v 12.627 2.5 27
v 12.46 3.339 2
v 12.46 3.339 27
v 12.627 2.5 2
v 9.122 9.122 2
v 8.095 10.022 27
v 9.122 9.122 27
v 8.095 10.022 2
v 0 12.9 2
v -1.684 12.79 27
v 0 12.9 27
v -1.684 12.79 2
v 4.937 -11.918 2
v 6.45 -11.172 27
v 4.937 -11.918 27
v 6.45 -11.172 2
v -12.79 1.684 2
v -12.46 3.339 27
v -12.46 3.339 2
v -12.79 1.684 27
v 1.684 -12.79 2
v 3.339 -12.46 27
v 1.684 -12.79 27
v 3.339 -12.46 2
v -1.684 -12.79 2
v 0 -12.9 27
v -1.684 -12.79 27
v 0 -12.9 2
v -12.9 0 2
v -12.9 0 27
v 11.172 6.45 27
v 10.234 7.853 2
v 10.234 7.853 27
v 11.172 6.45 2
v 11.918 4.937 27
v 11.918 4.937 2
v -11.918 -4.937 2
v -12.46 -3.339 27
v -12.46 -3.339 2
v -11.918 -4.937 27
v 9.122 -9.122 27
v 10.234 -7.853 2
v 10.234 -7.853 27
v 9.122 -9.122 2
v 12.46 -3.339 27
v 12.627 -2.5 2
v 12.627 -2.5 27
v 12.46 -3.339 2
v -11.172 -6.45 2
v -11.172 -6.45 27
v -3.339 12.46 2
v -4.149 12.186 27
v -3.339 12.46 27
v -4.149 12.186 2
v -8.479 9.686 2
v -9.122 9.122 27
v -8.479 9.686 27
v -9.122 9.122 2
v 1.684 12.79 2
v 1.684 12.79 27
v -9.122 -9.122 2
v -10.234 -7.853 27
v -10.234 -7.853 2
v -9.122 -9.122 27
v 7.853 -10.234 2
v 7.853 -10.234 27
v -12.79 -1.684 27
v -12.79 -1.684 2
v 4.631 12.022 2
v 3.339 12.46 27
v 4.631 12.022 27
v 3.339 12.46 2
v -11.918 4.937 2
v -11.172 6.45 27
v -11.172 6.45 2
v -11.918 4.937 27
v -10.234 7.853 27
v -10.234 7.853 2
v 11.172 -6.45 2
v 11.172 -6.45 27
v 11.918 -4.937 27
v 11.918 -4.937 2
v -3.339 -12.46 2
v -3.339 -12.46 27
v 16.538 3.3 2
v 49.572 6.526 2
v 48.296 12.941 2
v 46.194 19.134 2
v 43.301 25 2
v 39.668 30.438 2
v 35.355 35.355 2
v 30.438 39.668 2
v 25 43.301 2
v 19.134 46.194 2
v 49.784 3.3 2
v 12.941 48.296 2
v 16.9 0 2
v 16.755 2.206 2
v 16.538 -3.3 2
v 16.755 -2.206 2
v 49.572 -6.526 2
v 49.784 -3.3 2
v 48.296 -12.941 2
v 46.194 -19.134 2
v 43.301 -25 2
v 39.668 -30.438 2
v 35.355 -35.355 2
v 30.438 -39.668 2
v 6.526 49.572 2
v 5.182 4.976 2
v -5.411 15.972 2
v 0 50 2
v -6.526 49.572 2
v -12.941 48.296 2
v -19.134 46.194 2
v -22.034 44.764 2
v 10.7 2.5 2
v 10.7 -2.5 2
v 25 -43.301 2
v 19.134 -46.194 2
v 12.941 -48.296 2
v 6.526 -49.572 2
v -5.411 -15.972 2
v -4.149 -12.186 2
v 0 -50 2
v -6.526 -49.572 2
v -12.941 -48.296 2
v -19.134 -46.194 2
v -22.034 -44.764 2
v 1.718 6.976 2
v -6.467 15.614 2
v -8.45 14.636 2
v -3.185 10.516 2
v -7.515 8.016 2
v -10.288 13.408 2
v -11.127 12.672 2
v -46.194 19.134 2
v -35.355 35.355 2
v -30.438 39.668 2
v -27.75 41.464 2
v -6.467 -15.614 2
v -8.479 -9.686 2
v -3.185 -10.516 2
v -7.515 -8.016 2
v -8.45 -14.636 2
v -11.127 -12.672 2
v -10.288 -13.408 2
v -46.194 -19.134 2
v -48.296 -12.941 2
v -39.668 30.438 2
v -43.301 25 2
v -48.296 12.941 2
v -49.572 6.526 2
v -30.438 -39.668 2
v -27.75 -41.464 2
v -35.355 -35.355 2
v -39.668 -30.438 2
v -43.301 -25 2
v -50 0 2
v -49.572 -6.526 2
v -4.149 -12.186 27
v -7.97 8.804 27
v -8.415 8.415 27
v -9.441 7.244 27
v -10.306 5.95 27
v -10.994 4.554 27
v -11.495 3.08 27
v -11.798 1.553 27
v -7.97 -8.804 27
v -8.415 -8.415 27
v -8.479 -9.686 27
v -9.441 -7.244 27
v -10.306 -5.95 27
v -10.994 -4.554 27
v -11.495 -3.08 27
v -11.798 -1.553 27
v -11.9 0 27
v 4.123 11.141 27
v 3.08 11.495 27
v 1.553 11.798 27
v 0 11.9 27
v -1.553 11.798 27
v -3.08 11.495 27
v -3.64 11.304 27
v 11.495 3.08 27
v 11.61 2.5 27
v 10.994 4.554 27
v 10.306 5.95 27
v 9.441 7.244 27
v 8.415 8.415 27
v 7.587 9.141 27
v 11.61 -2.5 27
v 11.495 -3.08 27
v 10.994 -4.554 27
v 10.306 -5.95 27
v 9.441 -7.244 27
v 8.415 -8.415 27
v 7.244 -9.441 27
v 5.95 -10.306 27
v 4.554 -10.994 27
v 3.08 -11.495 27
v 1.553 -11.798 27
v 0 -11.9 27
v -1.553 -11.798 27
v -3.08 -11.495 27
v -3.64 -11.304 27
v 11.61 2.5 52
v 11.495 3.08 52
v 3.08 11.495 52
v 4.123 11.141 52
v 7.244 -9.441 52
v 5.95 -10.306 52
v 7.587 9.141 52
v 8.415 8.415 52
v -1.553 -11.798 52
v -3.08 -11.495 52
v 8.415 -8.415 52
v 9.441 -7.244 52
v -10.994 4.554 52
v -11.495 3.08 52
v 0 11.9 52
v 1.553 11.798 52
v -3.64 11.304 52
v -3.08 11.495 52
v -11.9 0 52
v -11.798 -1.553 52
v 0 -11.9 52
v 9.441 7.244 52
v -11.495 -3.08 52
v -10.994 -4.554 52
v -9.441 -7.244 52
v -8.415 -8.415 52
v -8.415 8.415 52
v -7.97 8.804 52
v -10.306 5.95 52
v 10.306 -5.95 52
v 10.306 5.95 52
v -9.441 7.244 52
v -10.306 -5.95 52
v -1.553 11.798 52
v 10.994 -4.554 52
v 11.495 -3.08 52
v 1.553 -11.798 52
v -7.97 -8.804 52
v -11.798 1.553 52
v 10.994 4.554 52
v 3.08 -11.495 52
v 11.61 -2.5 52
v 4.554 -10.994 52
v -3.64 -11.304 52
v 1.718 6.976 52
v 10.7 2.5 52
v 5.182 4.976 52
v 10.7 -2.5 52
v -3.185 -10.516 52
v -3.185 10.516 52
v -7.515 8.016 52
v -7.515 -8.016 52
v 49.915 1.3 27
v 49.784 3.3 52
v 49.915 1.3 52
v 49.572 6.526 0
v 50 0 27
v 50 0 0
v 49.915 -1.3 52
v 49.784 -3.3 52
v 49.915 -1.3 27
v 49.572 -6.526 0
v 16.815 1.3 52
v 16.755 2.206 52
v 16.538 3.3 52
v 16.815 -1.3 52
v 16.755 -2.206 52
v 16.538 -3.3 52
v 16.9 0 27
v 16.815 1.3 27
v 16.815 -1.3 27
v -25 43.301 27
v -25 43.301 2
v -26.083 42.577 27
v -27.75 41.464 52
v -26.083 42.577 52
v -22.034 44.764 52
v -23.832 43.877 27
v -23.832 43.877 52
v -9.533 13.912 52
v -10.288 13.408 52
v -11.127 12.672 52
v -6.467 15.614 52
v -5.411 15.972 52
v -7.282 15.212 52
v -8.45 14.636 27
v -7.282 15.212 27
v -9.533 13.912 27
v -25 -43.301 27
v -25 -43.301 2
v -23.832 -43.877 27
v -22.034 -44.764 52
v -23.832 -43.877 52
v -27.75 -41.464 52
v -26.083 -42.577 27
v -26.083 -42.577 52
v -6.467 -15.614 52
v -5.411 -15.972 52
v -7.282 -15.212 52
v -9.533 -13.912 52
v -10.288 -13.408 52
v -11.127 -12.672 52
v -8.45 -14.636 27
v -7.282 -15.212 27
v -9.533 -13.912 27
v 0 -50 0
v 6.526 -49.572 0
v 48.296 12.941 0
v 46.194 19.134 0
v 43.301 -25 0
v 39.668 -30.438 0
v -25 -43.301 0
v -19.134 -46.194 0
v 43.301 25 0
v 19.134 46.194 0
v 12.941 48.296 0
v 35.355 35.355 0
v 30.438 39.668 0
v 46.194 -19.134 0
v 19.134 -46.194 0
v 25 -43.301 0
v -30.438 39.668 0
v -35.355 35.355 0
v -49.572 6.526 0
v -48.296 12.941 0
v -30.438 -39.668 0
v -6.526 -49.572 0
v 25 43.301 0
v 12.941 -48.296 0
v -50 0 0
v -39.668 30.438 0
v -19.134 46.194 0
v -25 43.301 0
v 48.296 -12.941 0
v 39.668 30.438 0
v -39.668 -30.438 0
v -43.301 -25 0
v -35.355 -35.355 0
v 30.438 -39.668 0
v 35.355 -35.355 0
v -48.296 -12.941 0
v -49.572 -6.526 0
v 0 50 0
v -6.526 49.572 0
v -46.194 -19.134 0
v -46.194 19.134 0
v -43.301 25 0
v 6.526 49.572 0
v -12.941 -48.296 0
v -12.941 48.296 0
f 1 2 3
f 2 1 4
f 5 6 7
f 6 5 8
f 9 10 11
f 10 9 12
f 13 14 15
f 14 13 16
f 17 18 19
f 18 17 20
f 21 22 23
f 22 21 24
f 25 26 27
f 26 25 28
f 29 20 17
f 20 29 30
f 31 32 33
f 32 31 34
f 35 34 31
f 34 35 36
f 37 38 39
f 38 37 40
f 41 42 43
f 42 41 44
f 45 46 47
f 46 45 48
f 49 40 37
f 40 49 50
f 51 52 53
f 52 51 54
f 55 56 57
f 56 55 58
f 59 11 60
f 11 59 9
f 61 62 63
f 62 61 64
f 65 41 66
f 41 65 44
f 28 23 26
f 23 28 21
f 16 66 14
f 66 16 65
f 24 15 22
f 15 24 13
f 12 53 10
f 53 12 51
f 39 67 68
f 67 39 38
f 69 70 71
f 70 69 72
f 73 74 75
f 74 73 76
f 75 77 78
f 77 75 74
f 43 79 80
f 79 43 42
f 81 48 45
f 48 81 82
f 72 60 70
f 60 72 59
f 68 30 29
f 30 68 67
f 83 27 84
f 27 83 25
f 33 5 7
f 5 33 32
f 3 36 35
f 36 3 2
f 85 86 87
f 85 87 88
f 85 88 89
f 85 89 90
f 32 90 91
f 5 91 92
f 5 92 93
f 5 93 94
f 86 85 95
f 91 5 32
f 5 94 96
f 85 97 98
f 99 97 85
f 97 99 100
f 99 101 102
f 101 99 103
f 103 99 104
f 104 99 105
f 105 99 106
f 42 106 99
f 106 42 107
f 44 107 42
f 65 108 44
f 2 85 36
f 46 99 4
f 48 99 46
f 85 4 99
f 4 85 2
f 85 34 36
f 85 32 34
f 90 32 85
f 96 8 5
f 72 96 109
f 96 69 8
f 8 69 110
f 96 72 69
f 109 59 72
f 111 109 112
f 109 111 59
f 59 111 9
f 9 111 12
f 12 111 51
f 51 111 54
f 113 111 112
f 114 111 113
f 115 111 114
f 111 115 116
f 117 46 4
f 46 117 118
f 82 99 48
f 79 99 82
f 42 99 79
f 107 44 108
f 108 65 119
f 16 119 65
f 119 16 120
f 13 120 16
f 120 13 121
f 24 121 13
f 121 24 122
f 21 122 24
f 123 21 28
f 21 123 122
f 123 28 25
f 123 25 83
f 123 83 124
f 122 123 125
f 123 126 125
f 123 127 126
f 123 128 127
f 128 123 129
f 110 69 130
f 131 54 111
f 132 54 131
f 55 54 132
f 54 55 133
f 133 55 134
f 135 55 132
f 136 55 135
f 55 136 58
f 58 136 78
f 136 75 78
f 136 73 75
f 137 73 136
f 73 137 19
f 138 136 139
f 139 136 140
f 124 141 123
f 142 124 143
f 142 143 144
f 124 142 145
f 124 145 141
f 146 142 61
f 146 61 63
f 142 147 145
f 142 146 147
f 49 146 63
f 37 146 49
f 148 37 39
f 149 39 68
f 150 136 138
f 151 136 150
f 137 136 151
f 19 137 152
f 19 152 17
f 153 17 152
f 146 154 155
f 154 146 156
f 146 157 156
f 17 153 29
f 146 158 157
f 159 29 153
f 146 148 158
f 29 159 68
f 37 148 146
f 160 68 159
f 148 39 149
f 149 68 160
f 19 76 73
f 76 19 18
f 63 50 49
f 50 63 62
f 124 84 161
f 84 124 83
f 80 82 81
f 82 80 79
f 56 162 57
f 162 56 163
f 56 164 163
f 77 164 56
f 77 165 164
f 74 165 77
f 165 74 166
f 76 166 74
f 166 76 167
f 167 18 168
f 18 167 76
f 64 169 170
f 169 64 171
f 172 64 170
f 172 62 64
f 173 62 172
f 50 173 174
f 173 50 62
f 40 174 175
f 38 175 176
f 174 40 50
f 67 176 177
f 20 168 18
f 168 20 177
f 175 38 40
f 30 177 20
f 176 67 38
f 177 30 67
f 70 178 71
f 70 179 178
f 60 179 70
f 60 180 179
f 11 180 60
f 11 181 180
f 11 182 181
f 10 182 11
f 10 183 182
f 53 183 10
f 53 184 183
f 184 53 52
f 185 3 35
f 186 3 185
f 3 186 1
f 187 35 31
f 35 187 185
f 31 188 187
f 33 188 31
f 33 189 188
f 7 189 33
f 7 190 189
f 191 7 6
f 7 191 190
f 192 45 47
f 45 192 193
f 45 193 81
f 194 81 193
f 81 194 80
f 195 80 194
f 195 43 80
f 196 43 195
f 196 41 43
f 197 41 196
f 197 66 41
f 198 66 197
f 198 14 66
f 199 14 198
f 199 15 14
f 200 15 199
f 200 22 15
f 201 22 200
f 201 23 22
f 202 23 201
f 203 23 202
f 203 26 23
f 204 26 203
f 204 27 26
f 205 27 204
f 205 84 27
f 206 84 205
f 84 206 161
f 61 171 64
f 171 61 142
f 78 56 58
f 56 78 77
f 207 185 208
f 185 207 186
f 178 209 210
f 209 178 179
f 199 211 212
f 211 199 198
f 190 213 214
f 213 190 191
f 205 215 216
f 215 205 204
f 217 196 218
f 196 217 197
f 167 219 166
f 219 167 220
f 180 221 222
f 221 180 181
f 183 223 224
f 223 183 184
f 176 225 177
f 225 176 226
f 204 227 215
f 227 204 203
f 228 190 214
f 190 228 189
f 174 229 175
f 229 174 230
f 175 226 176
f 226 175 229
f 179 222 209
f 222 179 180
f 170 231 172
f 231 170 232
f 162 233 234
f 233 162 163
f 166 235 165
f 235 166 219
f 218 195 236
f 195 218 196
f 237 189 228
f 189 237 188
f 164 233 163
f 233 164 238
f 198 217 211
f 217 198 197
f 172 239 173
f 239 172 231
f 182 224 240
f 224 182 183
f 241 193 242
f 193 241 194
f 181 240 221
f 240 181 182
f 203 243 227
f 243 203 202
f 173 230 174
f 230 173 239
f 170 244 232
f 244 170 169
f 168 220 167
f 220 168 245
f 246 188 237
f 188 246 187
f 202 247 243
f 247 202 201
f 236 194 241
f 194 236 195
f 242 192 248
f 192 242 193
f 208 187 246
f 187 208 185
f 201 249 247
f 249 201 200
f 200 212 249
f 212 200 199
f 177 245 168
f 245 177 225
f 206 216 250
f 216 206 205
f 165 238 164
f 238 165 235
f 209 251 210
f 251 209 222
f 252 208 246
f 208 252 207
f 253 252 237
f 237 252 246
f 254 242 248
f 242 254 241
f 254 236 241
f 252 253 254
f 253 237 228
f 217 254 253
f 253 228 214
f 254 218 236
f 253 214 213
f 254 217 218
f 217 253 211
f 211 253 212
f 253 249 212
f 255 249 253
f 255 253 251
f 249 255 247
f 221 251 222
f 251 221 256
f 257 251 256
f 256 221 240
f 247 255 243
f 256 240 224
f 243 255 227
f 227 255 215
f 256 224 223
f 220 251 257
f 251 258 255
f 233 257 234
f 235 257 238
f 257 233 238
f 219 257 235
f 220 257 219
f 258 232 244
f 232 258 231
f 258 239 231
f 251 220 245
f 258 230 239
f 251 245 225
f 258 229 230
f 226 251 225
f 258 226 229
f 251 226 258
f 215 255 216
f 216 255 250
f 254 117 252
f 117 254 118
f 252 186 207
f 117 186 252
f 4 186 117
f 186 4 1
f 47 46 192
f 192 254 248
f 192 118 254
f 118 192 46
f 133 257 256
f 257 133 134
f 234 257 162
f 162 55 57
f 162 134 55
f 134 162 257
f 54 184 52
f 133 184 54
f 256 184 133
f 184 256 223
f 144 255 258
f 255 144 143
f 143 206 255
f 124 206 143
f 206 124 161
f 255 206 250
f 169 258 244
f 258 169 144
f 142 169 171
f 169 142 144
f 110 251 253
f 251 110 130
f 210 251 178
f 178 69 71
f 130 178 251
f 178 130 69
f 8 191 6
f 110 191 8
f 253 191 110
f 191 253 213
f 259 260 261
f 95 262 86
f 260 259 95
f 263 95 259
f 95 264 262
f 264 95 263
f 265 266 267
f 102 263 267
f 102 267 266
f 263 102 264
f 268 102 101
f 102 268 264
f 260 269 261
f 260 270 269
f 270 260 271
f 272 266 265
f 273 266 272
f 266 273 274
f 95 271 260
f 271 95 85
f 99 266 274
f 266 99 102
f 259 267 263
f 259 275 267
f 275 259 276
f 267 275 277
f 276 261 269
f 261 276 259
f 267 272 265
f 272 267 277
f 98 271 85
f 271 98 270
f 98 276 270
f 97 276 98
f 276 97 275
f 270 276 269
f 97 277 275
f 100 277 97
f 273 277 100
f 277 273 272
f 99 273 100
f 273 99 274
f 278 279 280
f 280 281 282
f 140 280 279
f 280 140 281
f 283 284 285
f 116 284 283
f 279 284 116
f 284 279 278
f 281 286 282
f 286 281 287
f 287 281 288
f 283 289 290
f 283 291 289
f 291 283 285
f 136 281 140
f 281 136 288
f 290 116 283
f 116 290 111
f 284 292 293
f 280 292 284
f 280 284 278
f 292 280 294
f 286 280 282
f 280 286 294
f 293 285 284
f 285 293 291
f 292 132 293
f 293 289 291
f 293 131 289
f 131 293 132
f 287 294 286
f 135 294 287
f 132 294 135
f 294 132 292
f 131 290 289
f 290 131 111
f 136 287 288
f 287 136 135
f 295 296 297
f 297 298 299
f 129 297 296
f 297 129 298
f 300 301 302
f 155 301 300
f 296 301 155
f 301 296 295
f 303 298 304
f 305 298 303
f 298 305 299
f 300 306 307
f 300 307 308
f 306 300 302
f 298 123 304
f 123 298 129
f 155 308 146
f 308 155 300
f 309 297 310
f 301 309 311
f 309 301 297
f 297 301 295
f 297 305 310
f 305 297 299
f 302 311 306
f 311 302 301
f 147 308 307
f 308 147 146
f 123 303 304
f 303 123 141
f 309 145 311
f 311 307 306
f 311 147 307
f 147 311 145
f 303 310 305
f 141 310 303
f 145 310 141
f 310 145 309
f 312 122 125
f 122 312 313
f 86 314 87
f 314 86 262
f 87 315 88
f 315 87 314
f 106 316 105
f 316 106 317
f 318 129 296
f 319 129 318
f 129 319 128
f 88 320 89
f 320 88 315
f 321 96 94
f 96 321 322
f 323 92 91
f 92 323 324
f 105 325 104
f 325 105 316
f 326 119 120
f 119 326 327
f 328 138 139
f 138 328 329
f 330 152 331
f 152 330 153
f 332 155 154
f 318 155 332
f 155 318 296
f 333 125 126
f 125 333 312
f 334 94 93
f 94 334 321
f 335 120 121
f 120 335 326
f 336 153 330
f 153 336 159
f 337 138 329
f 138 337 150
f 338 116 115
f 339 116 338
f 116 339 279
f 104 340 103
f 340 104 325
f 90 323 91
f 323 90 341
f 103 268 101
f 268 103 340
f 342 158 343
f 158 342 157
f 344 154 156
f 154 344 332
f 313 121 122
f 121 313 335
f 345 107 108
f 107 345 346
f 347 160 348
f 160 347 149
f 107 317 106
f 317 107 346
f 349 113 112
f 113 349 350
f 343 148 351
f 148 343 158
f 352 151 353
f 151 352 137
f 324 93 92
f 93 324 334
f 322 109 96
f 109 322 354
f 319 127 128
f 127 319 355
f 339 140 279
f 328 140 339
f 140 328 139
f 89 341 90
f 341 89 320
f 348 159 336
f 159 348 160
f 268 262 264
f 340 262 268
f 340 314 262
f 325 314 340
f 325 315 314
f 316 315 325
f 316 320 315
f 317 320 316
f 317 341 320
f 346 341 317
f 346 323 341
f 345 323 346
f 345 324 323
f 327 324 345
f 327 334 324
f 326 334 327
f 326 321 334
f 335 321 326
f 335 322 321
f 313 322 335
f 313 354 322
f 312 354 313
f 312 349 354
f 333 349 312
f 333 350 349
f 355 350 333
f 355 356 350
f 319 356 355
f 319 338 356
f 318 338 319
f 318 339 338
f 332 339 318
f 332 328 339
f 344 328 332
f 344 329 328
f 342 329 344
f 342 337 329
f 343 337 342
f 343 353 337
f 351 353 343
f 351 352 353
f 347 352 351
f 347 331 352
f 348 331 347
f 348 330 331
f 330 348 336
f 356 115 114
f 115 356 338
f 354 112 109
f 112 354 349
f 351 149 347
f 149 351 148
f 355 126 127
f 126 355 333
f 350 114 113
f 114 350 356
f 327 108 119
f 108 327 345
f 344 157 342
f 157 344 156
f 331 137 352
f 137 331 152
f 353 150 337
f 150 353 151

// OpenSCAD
// Copyright 2017 Arthur Davis (thingiverse.com/artdavis)
// This file is licensed under a Creative Commons Attribution 4.0
// International License.
// THE SOFTWARE IS PROVIDED "AS IS", WITHOUT WARRANTY OF ANY KIND, EXPRESS OR
// IMPLIED, INCLUDING BUT NOT LIMITED TO THE WARRANTIES OF MERCHANTABILITY,
// FITNESS FOR A PARTICULAR PURPOSE AND NONINFRINGEMENT. IN NO EVENT SHALL THE
// AUTHORS OR COPYRIGHT HOLDERS BE LIABLE FOR ANY CLAIM, DAMAGES OR OTHER
// LIABILITY, WHETHER IN AN ACTION OF CONTRACT, TORT OR OTHERWISE, ARISING
// FROM, OUT OF OR IN CONNECTION WITH THE SOFTWARE OR THE USE OR OTHER
// DEALINGS IN THE SOFTWARE.
//
// A customizable jig for aligning and gluing fins
// onto model rockets.

// Optimize view for Makerbot Customizer:
// preview[view:south east, tilt:top diagonal]

// Number of fins
nfins = 3; // [2:1:6]
// Diameter of the base stand
base_diam = 100; // [0:10:200]
// Wall feature thickness
wall_th = 2.0; // [0.2:0.2:6.0]
// Body tube inner diameter
tube_id = 23.8; // [10.0:0.1:50.0]
// Length of the body tube insert
insert_len = 25; // [10:0.2:60]
// Thickness at end of body tube insert to act as a stop
stop_th = 1.0; // [0.2:0.1:5]
// Length of the body tube stop
stop_len = 25; // [1:0.2:20]
// Slot width to fit thickness of rocket fins
slot_width = 2.6; // [0.2:0.1:10]
// Clearance between rocket body and fin alignment bosses
boss_clear = 4.0; // [0:1:20]
// How far below the end of the body tube the fins extend
slot_extend = 0; // [0:1:60]
// Height of fin alignment bosses
fbht = 50; // [10:1:100]
// Clearance for glue drips on the stop and insert
glue_clear = 1.2; // [0:0.2:3]
// Clearance width for accomodating an engine hook
hook_width = 4.0; // [0:0.2:10]
// Depth of the slot for accomodating an engine hook
hook_depth = 5.0; // [0:0.2:10]

/* [Hidden] */
// Special variables for facets/arcs
$fn = 48;
// Incremental offset to make good overlap for CSG operations
delta = 0.1;
// Thickness of fin alignment bosses
fbth = 2*wall_th + slot_width;
// Included angle between fins
fin_ang = 360 / nfins;
// Diameter of the "stop" cylinder
stop_diam = tube_id + 2*stop_th;
// The stop cylinder feature length needs to be at least
// as long as the slot extension. Choose the greater
// for the value to use as the actual feature height.
stop_len_1 = (slot_extend < stop_len) ? stop_len : slot_extend;

// Clearance geometry for stop and insert
module cleargeom() {
    clrth = slot_width + 2*glue_clear;
    cylht = wall_th + stop_len_1 + insert_len + delta;
    union() {
        for (i=[0:nfins-1]) {
            rotate(a = [0, 0, i * fin_ang]) {
                translate(v = [tube_id/2 - glue_clear, -clrth/2, 0]) {
                    // Clearance slot
                    cube(size = [base_diam/2, clrth, cylht]);
                }
            }
        }
        // Also include geometry that will make clearence for an
        // engine hook
        rotate(a = [0, 0, fin_ang/2]) {
            translate(v = [tube_id/2 - hook_depth, -hook_width/2, 0]) {
                // Clearance slot
                cube(size = [base_diam/2, hook_width, cylht]);
            }
        }
    }
}

// Fin boss
module finboss(ang=0) {
    cylht = wall_th + fbht + delta;
    slot_plane = wall_th + stop_len_1 - slot_extend;
    difference() {
        rotate(a = [0, 0, ang]) {
            // Cut out the fin slots
            difference() {
                // Trim fin slot boss to Base Diameter
                intersection() {
                    cylinder(h=cylht, d=base_diam);
                    translate(v = [0, -fbth/2, wall_th]) {
                        // Fin slot boss
                        cube(size = [base_diam/2, fbth, fbht]);
                    }
                }
                translate(v = [0, -slot_width/2, slot_plane]) {
                    // Fin slot
                    cube(size = [base_diam, slot_width, fbht + delta]);
                }
            }
        }
        translate(v=[0, 0, delta]){
            cylinder(h=cylht, d=stop_diam + 2*boss_clear);
        }
    }
}

// Create main base
module base() {
    union() {
        cylinder(h=wall_th, d=base_diam);
        translate(v=[0, 0, wall_th]){
            // Glue clerance slot cuts
            difference() {
                union() {
                    // Body tube stop cylinder
                    cylinder(h=stop_len_1, d=stop_diam);
                    translate(v=[0, 0, stop_len_1]){
                        // Body tube insert
                        cylinder(h=insert_len, d=tube_id);
                    }
                }
                // Glue clearence slots
                cleargeom();
            }
        }
        for (i=[0:nfins-1]) {
            finboss(i * fin_ang);
        }
    }
}

base();
